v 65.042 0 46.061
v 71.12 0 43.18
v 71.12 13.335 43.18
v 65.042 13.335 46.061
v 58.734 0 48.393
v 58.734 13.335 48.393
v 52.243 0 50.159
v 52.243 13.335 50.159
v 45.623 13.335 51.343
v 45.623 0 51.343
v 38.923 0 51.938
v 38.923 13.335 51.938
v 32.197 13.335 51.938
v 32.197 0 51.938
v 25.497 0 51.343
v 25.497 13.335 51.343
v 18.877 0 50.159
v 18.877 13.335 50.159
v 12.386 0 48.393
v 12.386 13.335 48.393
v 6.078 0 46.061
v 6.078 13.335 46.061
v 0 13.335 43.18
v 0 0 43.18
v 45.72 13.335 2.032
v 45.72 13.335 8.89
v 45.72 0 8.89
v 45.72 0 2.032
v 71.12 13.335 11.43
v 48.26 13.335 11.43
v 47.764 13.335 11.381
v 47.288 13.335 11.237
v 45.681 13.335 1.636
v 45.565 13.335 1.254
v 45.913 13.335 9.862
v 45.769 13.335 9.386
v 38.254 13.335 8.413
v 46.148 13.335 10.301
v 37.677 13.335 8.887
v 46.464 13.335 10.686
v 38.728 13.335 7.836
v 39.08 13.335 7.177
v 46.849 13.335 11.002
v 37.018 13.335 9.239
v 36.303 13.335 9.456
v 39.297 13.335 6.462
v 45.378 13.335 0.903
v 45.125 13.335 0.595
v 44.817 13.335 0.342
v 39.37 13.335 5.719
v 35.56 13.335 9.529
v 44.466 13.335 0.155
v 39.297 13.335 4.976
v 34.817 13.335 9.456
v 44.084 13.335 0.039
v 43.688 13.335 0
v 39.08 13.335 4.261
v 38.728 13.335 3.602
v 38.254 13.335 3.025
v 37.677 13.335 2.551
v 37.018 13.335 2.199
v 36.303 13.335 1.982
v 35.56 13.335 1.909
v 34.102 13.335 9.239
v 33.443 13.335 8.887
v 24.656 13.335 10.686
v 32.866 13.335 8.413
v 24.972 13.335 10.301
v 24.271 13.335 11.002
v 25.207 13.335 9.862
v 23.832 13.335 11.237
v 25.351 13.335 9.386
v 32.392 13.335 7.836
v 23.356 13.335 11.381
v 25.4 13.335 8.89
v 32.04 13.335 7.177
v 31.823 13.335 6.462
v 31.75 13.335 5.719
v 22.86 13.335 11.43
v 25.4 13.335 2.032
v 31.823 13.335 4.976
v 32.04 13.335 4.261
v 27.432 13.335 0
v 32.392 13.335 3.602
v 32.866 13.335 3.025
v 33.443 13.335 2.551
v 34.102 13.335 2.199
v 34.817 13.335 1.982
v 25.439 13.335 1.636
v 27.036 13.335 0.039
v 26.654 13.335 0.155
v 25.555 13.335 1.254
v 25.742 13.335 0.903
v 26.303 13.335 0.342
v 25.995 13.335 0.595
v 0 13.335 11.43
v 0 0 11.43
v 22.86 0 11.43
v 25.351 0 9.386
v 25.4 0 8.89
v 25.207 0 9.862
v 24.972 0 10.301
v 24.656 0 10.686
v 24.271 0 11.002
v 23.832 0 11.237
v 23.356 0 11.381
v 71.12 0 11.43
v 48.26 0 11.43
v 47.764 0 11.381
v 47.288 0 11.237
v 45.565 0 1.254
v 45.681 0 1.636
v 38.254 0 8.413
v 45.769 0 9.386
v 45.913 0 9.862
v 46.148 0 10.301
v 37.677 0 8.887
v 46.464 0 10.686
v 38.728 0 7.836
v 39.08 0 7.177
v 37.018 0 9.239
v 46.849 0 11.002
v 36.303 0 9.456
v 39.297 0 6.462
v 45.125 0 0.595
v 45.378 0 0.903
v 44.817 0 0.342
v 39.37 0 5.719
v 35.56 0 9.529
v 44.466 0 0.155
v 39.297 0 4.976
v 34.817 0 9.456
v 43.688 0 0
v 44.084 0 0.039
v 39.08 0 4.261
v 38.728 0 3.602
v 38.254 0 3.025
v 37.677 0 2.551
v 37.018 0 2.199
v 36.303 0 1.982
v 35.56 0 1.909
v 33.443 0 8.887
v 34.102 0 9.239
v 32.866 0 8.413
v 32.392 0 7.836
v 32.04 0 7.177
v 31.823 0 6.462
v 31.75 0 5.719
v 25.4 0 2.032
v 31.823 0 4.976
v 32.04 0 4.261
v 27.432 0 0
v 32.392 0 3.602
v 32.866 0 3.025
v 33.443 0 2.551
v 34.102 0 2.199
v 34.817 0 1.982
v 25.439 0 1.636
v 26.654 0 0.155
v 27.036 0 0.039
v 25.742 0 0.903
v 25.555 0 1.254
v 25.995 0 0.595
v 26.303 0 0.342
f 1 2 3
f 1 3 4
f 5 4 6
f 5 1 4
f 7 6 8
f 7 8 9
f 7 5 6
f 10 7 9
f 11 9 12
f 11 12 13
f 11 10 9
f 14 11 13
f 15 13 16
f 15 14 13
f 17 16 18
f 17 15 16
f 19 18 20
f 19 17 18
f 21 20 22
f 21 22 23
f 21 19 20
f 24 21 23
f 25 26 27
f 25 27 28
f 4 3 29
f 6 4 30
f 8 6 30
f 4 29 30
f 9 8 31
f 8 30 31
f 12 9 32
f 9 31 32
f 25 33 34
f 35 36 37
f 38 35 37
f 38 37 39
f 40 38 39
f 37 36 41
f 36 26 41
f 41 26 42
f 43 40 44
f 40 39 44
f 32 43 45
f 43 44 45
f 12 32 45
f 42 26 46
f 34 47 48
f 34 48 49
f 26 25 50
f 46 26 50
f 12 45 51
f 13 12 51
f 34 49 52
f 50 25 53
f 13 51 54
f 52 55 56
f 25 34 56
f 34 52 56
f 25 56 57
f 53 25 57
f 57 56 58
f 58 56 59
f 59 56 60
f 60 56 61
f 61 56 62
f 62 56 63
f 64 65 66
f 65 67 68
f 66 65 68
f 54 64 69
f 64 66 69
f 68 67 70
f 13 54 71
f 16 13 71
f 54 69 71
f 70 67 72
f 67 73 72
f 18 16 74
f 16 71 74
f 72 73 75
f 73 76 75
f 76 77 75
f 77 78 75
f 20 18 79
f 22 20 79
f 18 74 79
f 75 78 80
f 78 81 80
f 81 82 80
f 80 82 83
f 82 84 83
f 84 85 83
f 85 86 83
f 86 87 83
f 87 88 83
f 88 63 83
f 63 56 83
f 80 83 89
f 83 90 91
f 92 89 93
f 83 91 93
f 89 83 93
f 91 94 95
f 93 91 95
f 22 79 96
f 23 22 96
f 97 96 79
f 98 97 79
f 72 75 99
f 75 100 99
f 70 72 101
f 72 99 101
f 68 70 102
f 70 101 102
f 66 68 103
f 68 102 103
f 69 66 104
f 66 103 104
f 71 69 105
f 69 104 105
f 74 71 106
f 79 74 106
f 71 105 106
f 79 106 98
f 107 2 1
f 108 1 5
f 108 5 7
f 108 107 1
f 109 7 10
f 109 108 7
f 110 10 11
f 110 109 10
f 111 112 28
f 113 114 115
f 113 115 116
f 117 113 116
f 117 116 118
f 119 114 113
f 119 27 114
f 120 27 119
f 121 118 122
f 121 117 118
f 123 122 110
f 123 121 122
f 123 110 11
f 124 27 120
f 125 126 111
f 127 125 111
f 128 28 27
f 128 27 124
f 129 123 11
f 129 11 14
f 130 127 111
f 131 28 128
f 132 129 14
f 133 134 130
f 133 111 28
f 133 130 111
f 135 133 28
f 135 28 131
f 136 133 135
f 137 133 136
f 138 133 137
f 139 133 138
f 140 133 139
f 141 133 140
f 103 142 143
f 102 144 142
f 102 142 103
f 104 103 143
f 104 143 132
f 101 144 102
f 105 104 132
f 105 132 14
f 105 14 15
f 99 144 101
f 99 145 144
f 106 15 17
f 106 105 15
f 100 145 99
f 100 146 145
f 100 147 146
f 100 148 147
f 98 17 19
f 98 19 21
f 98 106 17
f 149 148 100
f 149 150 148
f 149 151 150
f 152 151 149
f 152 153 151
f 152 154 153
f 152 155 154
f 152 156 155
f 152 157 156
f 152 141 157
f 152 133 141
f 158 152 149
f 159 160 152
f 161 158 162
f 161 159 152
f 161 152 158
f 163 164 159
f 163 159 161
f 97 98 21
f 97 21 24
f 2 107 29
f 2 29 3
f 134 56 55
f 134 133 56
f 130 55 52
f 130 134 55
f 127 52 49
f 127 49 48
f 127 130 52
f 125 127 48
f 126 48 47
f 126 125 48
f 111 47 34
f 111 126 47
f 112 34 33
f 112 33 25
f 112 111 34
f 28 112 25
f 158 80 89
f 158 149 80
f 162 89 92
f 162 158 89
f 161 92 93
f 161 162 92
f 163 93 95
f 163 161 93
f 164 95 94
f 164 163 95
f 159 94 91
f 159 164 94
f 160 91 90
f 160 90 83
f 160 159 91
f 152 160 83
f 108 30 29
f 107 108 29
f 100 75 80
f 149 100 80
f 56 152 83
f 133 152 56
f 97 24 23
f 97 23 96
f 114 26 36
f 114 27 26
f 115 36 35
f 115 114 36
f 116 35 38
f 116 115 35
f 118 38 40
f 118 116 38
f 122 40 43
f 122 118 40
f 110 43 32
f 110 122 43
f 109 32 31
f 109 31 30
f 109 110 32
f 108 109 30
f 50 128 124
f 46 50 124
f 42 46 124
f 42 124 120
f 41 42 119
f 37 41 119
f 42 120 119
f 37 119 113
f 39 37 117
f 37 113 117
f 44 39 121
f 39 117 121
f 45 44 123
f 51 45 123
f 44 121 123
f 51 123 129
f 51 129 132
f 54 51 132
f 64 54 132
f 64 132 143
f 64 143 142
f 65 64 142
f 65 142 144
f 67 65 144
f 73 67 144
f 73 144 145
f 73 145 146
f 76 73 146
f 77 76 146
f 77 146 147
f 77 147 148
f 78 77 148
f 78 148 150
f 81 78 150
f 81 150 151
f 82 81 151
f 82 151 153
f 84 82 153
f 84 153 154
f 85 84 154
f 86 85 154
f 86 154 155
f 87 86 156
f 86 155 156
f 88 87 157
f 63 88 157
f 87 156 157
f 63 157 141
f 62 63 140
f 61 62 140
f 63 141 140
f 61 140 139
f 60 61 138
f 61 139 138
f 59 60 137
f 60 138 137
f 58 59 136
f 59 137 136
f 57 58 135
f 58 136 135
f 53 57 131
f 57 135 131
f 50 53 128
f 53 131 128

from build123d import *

# Parameters (mm, degrees)
BOSS_EXTRUDE2_DEPTH = 13.335
SKETCH10_W          = 25.4
SKETCH10_H          = 11.43
CUT_EXTRUDE1_DEPTH  = 14.335
FILLET1_R           = 2.54
FILLET2_R           = 2.032
SKETCH11_R          = 3.81
CUT_EXTRUDE2_DEPTH  = 14.335


with BuildPart() as part:
    # Sketch6 → Boss-Extrude2 (new body)
    with BuildSketch(Plane(origin=(0, 0, 0), x_dir=(1, 0, 0), z_dir=(0, 1, 0))):
        with BuildLine():
            Line((0, 0), (71.12, 0))
            Line((71.12, 0), (71.12, -43.18))
            ThreePointArc((71.12, -43.18), (35.56, -52.012400668), (0, -43.18))
            Line((0, -43.18), (0, 0))
        make_face()
    extrude(amount=BOSS_EXTRUDE2_DEPTH)

    # Sketch10 → Cut-Extrude1 (cut, through all)
    with BuildSketch(Plane(origin=(0, 13.335, 0), x_dir=(1, 0, 0), z_dir=(0, 1, 0))):
        with Locations((58.42, -5.715)):
            Rectangle(SKETCH10_W, SKETCH10_H)
        with Locations((12.7, -5.715)):
            Rectangle(SKETCH10_W, SKETCH10_H)
    extrude(amount=-CUT_EXTRUDE1_DEPTH, mode=Mode.SUBTRACT)

    # Fillet1
    fillet1_edges = [part.edges().sort_by_distance(p)[0] for p in [
        (25.4, 6.6675, 11.43),
        (45.72, 6.6675, 11.43),
    ]]
    fillet(fillet1_edges, radius=FILLET1_R)

    # Fillet2
    fillet2_edges = [part.edges().sort_by_distance(p)[0] for p in [
        (25.4, 6.6675, 0),
        (45.72, 6.6675, 0),
    ]]
    fillet(fillet2_edges, radius=FILLET2_R)

    # Sketch11 → Cut-Extrude2 (cut, through all)
    with BuildSketch(Plane.XZ):
        with Locations((35.56, 5.718912503)):
            Circle(SKETCH11_R)
    extrude(amount=-CUT_EXTRUDE2_DEPTH, mode=Mode.SUBTRACT)


solid = part.part
